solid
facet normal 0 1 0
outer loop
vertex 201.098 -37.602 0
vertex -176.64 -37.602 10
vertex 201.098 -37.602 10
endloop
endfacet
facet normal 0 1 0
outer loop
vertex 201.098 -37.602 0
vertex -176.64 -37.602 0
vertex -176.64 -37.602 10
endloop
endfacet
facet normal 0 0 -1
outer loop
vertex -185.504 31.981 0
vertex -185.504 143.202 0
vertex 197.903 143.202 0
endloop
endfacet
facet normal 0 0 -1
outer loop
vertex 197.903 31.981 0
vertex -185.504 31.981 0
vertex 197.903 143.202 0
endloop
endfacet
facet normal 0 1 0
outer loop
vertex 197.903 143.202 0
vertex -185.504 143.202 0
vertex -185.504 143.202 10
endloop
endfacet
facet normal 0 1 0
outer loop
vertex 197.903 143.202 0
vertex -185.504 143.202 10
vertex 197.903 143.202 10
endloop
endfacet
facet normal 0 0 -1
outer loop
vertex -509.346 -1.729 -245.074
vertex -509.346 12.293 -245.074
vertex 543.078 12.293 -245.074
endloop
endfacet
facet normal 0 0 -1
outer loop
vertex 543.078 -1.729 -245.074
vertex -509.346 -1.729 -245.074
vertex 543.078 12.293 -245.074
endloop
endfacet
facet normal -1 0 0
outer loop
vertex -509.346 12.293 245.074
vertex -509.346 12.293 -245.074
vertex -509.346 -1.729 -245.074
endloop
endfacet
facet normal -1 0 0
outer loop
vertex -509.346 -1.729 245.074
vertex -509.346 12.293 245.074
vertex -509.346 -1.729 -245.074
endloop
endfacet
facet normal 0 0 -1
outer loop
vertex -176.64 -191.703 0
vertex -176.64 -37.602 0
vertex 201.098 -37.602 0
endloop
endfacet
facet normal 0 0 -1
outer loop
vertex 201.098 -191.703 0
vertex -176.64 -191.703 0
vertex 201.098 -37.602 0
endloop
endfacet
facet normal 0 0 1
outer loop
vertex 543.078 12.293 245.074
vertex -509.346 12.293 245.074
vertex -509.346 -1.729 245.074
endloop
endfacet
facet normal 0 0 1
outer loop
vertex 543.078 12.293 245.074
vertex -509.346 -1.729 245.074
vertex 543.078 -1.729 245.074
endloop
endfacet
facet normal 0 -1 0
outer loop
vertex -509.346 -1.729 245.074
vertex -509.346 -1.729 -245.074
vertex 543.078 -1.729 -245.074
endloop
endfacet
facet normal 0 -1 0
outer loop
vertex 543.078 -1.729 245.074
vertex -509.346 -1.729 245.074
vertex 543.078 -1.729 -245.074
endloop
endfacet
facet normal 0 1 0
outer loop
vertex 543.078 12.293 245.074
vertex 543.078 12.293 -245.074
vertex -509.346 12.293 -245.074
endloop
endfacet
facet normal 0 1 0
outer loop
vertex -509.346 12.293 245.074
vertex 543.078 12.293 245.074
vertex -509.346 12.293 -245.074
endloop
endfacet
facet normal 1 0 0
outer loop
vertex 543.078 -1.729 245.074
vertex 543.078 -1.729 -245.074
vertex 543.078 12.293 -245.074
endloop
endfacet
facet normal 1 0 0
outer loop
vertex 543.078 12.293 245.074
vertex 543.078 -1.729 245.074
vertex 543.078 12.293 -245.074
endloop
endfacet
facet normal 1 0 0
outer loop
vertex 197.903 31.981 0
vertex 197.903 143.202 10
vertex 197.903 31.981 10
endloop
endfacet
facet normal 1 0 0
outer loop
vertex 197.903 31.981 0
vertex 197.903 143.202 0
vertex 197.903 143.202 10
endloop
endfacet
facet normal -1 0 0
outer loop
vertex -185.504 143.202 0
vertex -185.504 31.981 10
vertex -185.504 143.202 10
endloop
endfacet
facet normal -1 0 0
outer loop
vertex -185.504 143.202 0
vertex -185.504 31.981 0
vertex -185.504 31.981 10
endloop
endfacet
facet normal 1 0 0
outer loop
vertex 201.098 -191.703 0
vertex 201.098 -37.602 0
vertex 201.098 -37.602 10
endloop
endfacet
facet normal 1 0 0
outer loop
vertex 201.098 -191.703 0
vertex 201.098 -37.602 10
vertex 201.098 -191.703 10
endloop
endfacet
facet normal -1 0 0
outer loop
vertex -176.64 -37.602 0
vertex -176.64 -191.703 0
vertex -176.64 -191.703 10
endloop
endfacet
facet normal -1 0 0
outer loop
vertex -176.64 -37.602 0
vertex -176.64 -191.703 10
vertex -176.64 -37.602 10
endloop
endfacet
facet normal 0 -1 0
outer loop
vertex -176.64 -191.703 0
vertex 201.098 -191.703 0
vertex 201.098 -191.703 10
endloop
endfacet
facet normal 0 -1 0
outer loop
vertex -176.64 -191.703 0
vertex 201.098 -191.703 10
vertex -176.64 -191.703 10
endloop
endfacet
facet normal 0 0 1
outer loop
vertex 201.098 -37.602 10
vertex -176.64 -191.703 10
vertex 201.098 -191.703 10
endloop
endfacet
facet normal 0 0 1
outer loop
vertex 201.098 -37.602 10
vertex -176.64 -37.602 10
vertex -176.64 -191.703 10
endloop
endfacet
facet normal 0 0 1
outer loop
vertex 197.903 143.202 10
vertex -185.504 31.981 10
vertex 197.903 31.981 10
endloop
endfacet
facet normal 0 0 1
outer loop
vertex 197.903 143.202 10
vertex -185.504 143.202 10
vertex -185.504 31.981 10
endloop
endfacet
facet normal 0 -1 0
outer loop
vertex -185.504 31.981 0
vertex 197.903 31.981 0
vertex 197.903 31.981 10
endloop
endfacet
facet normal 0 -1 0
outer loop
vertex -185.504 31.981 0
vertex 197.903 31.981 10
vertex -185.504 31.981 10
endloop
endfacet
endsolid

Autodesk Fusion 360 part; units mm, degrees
sketch "Sketch1" plane through (0, 0, 0) normal (0, 0, 1) x (1, 0, 0)
  line L0 (-185.5036, 143.2023) -> (197.9033, 143.2023)
  line L1 (197.9033, 143.2023) -> (197.9033, 31.9807)
  line L2 (197.9033, 31.9807) -> (-185.5036, 31.9807)
  line L3 (-185.5036, 31.9807) -> (-185.5036, 143.2023)
  line L4 (-509.3458, -1.7289) -> (543.0785, -1.7289)
  line L5 (543.0785, -1.7289) -> (543.0785, 12.2929)
  line L6 (543.0785, 12.2929) -> (-509.3458, 12.2929)
  line L7 (-509.3458, 12.2929) -> (-509.3458, -1.7289)
  line L8 (-176.6396, -37.6024) -> (201.0979, -37.6024)
  line L9 (201.0979, -37.6024) -> (201.0979, -191.7031)
  line L10 (201.0979, -191.7031) -> (-176.6396, -191.7031)
  line L11 (-176.6396, -191.7031) -> (-176.6396, -37.6024)
extrude "Extrude1" add sketch "Sketch1" along normal blind 10 contours L0 L1 L2 L3 | L8 L9 L10 L11 makes body 1 at (-57.7013, 106.1284, 0) makes body 2 at (-50.7271, -140.3362, 0)
extrude "Extrude2" add sketch "Sketch1" along normal mid plane 490.148 separate body contours L4 L5 L6 L7 makes body 3
